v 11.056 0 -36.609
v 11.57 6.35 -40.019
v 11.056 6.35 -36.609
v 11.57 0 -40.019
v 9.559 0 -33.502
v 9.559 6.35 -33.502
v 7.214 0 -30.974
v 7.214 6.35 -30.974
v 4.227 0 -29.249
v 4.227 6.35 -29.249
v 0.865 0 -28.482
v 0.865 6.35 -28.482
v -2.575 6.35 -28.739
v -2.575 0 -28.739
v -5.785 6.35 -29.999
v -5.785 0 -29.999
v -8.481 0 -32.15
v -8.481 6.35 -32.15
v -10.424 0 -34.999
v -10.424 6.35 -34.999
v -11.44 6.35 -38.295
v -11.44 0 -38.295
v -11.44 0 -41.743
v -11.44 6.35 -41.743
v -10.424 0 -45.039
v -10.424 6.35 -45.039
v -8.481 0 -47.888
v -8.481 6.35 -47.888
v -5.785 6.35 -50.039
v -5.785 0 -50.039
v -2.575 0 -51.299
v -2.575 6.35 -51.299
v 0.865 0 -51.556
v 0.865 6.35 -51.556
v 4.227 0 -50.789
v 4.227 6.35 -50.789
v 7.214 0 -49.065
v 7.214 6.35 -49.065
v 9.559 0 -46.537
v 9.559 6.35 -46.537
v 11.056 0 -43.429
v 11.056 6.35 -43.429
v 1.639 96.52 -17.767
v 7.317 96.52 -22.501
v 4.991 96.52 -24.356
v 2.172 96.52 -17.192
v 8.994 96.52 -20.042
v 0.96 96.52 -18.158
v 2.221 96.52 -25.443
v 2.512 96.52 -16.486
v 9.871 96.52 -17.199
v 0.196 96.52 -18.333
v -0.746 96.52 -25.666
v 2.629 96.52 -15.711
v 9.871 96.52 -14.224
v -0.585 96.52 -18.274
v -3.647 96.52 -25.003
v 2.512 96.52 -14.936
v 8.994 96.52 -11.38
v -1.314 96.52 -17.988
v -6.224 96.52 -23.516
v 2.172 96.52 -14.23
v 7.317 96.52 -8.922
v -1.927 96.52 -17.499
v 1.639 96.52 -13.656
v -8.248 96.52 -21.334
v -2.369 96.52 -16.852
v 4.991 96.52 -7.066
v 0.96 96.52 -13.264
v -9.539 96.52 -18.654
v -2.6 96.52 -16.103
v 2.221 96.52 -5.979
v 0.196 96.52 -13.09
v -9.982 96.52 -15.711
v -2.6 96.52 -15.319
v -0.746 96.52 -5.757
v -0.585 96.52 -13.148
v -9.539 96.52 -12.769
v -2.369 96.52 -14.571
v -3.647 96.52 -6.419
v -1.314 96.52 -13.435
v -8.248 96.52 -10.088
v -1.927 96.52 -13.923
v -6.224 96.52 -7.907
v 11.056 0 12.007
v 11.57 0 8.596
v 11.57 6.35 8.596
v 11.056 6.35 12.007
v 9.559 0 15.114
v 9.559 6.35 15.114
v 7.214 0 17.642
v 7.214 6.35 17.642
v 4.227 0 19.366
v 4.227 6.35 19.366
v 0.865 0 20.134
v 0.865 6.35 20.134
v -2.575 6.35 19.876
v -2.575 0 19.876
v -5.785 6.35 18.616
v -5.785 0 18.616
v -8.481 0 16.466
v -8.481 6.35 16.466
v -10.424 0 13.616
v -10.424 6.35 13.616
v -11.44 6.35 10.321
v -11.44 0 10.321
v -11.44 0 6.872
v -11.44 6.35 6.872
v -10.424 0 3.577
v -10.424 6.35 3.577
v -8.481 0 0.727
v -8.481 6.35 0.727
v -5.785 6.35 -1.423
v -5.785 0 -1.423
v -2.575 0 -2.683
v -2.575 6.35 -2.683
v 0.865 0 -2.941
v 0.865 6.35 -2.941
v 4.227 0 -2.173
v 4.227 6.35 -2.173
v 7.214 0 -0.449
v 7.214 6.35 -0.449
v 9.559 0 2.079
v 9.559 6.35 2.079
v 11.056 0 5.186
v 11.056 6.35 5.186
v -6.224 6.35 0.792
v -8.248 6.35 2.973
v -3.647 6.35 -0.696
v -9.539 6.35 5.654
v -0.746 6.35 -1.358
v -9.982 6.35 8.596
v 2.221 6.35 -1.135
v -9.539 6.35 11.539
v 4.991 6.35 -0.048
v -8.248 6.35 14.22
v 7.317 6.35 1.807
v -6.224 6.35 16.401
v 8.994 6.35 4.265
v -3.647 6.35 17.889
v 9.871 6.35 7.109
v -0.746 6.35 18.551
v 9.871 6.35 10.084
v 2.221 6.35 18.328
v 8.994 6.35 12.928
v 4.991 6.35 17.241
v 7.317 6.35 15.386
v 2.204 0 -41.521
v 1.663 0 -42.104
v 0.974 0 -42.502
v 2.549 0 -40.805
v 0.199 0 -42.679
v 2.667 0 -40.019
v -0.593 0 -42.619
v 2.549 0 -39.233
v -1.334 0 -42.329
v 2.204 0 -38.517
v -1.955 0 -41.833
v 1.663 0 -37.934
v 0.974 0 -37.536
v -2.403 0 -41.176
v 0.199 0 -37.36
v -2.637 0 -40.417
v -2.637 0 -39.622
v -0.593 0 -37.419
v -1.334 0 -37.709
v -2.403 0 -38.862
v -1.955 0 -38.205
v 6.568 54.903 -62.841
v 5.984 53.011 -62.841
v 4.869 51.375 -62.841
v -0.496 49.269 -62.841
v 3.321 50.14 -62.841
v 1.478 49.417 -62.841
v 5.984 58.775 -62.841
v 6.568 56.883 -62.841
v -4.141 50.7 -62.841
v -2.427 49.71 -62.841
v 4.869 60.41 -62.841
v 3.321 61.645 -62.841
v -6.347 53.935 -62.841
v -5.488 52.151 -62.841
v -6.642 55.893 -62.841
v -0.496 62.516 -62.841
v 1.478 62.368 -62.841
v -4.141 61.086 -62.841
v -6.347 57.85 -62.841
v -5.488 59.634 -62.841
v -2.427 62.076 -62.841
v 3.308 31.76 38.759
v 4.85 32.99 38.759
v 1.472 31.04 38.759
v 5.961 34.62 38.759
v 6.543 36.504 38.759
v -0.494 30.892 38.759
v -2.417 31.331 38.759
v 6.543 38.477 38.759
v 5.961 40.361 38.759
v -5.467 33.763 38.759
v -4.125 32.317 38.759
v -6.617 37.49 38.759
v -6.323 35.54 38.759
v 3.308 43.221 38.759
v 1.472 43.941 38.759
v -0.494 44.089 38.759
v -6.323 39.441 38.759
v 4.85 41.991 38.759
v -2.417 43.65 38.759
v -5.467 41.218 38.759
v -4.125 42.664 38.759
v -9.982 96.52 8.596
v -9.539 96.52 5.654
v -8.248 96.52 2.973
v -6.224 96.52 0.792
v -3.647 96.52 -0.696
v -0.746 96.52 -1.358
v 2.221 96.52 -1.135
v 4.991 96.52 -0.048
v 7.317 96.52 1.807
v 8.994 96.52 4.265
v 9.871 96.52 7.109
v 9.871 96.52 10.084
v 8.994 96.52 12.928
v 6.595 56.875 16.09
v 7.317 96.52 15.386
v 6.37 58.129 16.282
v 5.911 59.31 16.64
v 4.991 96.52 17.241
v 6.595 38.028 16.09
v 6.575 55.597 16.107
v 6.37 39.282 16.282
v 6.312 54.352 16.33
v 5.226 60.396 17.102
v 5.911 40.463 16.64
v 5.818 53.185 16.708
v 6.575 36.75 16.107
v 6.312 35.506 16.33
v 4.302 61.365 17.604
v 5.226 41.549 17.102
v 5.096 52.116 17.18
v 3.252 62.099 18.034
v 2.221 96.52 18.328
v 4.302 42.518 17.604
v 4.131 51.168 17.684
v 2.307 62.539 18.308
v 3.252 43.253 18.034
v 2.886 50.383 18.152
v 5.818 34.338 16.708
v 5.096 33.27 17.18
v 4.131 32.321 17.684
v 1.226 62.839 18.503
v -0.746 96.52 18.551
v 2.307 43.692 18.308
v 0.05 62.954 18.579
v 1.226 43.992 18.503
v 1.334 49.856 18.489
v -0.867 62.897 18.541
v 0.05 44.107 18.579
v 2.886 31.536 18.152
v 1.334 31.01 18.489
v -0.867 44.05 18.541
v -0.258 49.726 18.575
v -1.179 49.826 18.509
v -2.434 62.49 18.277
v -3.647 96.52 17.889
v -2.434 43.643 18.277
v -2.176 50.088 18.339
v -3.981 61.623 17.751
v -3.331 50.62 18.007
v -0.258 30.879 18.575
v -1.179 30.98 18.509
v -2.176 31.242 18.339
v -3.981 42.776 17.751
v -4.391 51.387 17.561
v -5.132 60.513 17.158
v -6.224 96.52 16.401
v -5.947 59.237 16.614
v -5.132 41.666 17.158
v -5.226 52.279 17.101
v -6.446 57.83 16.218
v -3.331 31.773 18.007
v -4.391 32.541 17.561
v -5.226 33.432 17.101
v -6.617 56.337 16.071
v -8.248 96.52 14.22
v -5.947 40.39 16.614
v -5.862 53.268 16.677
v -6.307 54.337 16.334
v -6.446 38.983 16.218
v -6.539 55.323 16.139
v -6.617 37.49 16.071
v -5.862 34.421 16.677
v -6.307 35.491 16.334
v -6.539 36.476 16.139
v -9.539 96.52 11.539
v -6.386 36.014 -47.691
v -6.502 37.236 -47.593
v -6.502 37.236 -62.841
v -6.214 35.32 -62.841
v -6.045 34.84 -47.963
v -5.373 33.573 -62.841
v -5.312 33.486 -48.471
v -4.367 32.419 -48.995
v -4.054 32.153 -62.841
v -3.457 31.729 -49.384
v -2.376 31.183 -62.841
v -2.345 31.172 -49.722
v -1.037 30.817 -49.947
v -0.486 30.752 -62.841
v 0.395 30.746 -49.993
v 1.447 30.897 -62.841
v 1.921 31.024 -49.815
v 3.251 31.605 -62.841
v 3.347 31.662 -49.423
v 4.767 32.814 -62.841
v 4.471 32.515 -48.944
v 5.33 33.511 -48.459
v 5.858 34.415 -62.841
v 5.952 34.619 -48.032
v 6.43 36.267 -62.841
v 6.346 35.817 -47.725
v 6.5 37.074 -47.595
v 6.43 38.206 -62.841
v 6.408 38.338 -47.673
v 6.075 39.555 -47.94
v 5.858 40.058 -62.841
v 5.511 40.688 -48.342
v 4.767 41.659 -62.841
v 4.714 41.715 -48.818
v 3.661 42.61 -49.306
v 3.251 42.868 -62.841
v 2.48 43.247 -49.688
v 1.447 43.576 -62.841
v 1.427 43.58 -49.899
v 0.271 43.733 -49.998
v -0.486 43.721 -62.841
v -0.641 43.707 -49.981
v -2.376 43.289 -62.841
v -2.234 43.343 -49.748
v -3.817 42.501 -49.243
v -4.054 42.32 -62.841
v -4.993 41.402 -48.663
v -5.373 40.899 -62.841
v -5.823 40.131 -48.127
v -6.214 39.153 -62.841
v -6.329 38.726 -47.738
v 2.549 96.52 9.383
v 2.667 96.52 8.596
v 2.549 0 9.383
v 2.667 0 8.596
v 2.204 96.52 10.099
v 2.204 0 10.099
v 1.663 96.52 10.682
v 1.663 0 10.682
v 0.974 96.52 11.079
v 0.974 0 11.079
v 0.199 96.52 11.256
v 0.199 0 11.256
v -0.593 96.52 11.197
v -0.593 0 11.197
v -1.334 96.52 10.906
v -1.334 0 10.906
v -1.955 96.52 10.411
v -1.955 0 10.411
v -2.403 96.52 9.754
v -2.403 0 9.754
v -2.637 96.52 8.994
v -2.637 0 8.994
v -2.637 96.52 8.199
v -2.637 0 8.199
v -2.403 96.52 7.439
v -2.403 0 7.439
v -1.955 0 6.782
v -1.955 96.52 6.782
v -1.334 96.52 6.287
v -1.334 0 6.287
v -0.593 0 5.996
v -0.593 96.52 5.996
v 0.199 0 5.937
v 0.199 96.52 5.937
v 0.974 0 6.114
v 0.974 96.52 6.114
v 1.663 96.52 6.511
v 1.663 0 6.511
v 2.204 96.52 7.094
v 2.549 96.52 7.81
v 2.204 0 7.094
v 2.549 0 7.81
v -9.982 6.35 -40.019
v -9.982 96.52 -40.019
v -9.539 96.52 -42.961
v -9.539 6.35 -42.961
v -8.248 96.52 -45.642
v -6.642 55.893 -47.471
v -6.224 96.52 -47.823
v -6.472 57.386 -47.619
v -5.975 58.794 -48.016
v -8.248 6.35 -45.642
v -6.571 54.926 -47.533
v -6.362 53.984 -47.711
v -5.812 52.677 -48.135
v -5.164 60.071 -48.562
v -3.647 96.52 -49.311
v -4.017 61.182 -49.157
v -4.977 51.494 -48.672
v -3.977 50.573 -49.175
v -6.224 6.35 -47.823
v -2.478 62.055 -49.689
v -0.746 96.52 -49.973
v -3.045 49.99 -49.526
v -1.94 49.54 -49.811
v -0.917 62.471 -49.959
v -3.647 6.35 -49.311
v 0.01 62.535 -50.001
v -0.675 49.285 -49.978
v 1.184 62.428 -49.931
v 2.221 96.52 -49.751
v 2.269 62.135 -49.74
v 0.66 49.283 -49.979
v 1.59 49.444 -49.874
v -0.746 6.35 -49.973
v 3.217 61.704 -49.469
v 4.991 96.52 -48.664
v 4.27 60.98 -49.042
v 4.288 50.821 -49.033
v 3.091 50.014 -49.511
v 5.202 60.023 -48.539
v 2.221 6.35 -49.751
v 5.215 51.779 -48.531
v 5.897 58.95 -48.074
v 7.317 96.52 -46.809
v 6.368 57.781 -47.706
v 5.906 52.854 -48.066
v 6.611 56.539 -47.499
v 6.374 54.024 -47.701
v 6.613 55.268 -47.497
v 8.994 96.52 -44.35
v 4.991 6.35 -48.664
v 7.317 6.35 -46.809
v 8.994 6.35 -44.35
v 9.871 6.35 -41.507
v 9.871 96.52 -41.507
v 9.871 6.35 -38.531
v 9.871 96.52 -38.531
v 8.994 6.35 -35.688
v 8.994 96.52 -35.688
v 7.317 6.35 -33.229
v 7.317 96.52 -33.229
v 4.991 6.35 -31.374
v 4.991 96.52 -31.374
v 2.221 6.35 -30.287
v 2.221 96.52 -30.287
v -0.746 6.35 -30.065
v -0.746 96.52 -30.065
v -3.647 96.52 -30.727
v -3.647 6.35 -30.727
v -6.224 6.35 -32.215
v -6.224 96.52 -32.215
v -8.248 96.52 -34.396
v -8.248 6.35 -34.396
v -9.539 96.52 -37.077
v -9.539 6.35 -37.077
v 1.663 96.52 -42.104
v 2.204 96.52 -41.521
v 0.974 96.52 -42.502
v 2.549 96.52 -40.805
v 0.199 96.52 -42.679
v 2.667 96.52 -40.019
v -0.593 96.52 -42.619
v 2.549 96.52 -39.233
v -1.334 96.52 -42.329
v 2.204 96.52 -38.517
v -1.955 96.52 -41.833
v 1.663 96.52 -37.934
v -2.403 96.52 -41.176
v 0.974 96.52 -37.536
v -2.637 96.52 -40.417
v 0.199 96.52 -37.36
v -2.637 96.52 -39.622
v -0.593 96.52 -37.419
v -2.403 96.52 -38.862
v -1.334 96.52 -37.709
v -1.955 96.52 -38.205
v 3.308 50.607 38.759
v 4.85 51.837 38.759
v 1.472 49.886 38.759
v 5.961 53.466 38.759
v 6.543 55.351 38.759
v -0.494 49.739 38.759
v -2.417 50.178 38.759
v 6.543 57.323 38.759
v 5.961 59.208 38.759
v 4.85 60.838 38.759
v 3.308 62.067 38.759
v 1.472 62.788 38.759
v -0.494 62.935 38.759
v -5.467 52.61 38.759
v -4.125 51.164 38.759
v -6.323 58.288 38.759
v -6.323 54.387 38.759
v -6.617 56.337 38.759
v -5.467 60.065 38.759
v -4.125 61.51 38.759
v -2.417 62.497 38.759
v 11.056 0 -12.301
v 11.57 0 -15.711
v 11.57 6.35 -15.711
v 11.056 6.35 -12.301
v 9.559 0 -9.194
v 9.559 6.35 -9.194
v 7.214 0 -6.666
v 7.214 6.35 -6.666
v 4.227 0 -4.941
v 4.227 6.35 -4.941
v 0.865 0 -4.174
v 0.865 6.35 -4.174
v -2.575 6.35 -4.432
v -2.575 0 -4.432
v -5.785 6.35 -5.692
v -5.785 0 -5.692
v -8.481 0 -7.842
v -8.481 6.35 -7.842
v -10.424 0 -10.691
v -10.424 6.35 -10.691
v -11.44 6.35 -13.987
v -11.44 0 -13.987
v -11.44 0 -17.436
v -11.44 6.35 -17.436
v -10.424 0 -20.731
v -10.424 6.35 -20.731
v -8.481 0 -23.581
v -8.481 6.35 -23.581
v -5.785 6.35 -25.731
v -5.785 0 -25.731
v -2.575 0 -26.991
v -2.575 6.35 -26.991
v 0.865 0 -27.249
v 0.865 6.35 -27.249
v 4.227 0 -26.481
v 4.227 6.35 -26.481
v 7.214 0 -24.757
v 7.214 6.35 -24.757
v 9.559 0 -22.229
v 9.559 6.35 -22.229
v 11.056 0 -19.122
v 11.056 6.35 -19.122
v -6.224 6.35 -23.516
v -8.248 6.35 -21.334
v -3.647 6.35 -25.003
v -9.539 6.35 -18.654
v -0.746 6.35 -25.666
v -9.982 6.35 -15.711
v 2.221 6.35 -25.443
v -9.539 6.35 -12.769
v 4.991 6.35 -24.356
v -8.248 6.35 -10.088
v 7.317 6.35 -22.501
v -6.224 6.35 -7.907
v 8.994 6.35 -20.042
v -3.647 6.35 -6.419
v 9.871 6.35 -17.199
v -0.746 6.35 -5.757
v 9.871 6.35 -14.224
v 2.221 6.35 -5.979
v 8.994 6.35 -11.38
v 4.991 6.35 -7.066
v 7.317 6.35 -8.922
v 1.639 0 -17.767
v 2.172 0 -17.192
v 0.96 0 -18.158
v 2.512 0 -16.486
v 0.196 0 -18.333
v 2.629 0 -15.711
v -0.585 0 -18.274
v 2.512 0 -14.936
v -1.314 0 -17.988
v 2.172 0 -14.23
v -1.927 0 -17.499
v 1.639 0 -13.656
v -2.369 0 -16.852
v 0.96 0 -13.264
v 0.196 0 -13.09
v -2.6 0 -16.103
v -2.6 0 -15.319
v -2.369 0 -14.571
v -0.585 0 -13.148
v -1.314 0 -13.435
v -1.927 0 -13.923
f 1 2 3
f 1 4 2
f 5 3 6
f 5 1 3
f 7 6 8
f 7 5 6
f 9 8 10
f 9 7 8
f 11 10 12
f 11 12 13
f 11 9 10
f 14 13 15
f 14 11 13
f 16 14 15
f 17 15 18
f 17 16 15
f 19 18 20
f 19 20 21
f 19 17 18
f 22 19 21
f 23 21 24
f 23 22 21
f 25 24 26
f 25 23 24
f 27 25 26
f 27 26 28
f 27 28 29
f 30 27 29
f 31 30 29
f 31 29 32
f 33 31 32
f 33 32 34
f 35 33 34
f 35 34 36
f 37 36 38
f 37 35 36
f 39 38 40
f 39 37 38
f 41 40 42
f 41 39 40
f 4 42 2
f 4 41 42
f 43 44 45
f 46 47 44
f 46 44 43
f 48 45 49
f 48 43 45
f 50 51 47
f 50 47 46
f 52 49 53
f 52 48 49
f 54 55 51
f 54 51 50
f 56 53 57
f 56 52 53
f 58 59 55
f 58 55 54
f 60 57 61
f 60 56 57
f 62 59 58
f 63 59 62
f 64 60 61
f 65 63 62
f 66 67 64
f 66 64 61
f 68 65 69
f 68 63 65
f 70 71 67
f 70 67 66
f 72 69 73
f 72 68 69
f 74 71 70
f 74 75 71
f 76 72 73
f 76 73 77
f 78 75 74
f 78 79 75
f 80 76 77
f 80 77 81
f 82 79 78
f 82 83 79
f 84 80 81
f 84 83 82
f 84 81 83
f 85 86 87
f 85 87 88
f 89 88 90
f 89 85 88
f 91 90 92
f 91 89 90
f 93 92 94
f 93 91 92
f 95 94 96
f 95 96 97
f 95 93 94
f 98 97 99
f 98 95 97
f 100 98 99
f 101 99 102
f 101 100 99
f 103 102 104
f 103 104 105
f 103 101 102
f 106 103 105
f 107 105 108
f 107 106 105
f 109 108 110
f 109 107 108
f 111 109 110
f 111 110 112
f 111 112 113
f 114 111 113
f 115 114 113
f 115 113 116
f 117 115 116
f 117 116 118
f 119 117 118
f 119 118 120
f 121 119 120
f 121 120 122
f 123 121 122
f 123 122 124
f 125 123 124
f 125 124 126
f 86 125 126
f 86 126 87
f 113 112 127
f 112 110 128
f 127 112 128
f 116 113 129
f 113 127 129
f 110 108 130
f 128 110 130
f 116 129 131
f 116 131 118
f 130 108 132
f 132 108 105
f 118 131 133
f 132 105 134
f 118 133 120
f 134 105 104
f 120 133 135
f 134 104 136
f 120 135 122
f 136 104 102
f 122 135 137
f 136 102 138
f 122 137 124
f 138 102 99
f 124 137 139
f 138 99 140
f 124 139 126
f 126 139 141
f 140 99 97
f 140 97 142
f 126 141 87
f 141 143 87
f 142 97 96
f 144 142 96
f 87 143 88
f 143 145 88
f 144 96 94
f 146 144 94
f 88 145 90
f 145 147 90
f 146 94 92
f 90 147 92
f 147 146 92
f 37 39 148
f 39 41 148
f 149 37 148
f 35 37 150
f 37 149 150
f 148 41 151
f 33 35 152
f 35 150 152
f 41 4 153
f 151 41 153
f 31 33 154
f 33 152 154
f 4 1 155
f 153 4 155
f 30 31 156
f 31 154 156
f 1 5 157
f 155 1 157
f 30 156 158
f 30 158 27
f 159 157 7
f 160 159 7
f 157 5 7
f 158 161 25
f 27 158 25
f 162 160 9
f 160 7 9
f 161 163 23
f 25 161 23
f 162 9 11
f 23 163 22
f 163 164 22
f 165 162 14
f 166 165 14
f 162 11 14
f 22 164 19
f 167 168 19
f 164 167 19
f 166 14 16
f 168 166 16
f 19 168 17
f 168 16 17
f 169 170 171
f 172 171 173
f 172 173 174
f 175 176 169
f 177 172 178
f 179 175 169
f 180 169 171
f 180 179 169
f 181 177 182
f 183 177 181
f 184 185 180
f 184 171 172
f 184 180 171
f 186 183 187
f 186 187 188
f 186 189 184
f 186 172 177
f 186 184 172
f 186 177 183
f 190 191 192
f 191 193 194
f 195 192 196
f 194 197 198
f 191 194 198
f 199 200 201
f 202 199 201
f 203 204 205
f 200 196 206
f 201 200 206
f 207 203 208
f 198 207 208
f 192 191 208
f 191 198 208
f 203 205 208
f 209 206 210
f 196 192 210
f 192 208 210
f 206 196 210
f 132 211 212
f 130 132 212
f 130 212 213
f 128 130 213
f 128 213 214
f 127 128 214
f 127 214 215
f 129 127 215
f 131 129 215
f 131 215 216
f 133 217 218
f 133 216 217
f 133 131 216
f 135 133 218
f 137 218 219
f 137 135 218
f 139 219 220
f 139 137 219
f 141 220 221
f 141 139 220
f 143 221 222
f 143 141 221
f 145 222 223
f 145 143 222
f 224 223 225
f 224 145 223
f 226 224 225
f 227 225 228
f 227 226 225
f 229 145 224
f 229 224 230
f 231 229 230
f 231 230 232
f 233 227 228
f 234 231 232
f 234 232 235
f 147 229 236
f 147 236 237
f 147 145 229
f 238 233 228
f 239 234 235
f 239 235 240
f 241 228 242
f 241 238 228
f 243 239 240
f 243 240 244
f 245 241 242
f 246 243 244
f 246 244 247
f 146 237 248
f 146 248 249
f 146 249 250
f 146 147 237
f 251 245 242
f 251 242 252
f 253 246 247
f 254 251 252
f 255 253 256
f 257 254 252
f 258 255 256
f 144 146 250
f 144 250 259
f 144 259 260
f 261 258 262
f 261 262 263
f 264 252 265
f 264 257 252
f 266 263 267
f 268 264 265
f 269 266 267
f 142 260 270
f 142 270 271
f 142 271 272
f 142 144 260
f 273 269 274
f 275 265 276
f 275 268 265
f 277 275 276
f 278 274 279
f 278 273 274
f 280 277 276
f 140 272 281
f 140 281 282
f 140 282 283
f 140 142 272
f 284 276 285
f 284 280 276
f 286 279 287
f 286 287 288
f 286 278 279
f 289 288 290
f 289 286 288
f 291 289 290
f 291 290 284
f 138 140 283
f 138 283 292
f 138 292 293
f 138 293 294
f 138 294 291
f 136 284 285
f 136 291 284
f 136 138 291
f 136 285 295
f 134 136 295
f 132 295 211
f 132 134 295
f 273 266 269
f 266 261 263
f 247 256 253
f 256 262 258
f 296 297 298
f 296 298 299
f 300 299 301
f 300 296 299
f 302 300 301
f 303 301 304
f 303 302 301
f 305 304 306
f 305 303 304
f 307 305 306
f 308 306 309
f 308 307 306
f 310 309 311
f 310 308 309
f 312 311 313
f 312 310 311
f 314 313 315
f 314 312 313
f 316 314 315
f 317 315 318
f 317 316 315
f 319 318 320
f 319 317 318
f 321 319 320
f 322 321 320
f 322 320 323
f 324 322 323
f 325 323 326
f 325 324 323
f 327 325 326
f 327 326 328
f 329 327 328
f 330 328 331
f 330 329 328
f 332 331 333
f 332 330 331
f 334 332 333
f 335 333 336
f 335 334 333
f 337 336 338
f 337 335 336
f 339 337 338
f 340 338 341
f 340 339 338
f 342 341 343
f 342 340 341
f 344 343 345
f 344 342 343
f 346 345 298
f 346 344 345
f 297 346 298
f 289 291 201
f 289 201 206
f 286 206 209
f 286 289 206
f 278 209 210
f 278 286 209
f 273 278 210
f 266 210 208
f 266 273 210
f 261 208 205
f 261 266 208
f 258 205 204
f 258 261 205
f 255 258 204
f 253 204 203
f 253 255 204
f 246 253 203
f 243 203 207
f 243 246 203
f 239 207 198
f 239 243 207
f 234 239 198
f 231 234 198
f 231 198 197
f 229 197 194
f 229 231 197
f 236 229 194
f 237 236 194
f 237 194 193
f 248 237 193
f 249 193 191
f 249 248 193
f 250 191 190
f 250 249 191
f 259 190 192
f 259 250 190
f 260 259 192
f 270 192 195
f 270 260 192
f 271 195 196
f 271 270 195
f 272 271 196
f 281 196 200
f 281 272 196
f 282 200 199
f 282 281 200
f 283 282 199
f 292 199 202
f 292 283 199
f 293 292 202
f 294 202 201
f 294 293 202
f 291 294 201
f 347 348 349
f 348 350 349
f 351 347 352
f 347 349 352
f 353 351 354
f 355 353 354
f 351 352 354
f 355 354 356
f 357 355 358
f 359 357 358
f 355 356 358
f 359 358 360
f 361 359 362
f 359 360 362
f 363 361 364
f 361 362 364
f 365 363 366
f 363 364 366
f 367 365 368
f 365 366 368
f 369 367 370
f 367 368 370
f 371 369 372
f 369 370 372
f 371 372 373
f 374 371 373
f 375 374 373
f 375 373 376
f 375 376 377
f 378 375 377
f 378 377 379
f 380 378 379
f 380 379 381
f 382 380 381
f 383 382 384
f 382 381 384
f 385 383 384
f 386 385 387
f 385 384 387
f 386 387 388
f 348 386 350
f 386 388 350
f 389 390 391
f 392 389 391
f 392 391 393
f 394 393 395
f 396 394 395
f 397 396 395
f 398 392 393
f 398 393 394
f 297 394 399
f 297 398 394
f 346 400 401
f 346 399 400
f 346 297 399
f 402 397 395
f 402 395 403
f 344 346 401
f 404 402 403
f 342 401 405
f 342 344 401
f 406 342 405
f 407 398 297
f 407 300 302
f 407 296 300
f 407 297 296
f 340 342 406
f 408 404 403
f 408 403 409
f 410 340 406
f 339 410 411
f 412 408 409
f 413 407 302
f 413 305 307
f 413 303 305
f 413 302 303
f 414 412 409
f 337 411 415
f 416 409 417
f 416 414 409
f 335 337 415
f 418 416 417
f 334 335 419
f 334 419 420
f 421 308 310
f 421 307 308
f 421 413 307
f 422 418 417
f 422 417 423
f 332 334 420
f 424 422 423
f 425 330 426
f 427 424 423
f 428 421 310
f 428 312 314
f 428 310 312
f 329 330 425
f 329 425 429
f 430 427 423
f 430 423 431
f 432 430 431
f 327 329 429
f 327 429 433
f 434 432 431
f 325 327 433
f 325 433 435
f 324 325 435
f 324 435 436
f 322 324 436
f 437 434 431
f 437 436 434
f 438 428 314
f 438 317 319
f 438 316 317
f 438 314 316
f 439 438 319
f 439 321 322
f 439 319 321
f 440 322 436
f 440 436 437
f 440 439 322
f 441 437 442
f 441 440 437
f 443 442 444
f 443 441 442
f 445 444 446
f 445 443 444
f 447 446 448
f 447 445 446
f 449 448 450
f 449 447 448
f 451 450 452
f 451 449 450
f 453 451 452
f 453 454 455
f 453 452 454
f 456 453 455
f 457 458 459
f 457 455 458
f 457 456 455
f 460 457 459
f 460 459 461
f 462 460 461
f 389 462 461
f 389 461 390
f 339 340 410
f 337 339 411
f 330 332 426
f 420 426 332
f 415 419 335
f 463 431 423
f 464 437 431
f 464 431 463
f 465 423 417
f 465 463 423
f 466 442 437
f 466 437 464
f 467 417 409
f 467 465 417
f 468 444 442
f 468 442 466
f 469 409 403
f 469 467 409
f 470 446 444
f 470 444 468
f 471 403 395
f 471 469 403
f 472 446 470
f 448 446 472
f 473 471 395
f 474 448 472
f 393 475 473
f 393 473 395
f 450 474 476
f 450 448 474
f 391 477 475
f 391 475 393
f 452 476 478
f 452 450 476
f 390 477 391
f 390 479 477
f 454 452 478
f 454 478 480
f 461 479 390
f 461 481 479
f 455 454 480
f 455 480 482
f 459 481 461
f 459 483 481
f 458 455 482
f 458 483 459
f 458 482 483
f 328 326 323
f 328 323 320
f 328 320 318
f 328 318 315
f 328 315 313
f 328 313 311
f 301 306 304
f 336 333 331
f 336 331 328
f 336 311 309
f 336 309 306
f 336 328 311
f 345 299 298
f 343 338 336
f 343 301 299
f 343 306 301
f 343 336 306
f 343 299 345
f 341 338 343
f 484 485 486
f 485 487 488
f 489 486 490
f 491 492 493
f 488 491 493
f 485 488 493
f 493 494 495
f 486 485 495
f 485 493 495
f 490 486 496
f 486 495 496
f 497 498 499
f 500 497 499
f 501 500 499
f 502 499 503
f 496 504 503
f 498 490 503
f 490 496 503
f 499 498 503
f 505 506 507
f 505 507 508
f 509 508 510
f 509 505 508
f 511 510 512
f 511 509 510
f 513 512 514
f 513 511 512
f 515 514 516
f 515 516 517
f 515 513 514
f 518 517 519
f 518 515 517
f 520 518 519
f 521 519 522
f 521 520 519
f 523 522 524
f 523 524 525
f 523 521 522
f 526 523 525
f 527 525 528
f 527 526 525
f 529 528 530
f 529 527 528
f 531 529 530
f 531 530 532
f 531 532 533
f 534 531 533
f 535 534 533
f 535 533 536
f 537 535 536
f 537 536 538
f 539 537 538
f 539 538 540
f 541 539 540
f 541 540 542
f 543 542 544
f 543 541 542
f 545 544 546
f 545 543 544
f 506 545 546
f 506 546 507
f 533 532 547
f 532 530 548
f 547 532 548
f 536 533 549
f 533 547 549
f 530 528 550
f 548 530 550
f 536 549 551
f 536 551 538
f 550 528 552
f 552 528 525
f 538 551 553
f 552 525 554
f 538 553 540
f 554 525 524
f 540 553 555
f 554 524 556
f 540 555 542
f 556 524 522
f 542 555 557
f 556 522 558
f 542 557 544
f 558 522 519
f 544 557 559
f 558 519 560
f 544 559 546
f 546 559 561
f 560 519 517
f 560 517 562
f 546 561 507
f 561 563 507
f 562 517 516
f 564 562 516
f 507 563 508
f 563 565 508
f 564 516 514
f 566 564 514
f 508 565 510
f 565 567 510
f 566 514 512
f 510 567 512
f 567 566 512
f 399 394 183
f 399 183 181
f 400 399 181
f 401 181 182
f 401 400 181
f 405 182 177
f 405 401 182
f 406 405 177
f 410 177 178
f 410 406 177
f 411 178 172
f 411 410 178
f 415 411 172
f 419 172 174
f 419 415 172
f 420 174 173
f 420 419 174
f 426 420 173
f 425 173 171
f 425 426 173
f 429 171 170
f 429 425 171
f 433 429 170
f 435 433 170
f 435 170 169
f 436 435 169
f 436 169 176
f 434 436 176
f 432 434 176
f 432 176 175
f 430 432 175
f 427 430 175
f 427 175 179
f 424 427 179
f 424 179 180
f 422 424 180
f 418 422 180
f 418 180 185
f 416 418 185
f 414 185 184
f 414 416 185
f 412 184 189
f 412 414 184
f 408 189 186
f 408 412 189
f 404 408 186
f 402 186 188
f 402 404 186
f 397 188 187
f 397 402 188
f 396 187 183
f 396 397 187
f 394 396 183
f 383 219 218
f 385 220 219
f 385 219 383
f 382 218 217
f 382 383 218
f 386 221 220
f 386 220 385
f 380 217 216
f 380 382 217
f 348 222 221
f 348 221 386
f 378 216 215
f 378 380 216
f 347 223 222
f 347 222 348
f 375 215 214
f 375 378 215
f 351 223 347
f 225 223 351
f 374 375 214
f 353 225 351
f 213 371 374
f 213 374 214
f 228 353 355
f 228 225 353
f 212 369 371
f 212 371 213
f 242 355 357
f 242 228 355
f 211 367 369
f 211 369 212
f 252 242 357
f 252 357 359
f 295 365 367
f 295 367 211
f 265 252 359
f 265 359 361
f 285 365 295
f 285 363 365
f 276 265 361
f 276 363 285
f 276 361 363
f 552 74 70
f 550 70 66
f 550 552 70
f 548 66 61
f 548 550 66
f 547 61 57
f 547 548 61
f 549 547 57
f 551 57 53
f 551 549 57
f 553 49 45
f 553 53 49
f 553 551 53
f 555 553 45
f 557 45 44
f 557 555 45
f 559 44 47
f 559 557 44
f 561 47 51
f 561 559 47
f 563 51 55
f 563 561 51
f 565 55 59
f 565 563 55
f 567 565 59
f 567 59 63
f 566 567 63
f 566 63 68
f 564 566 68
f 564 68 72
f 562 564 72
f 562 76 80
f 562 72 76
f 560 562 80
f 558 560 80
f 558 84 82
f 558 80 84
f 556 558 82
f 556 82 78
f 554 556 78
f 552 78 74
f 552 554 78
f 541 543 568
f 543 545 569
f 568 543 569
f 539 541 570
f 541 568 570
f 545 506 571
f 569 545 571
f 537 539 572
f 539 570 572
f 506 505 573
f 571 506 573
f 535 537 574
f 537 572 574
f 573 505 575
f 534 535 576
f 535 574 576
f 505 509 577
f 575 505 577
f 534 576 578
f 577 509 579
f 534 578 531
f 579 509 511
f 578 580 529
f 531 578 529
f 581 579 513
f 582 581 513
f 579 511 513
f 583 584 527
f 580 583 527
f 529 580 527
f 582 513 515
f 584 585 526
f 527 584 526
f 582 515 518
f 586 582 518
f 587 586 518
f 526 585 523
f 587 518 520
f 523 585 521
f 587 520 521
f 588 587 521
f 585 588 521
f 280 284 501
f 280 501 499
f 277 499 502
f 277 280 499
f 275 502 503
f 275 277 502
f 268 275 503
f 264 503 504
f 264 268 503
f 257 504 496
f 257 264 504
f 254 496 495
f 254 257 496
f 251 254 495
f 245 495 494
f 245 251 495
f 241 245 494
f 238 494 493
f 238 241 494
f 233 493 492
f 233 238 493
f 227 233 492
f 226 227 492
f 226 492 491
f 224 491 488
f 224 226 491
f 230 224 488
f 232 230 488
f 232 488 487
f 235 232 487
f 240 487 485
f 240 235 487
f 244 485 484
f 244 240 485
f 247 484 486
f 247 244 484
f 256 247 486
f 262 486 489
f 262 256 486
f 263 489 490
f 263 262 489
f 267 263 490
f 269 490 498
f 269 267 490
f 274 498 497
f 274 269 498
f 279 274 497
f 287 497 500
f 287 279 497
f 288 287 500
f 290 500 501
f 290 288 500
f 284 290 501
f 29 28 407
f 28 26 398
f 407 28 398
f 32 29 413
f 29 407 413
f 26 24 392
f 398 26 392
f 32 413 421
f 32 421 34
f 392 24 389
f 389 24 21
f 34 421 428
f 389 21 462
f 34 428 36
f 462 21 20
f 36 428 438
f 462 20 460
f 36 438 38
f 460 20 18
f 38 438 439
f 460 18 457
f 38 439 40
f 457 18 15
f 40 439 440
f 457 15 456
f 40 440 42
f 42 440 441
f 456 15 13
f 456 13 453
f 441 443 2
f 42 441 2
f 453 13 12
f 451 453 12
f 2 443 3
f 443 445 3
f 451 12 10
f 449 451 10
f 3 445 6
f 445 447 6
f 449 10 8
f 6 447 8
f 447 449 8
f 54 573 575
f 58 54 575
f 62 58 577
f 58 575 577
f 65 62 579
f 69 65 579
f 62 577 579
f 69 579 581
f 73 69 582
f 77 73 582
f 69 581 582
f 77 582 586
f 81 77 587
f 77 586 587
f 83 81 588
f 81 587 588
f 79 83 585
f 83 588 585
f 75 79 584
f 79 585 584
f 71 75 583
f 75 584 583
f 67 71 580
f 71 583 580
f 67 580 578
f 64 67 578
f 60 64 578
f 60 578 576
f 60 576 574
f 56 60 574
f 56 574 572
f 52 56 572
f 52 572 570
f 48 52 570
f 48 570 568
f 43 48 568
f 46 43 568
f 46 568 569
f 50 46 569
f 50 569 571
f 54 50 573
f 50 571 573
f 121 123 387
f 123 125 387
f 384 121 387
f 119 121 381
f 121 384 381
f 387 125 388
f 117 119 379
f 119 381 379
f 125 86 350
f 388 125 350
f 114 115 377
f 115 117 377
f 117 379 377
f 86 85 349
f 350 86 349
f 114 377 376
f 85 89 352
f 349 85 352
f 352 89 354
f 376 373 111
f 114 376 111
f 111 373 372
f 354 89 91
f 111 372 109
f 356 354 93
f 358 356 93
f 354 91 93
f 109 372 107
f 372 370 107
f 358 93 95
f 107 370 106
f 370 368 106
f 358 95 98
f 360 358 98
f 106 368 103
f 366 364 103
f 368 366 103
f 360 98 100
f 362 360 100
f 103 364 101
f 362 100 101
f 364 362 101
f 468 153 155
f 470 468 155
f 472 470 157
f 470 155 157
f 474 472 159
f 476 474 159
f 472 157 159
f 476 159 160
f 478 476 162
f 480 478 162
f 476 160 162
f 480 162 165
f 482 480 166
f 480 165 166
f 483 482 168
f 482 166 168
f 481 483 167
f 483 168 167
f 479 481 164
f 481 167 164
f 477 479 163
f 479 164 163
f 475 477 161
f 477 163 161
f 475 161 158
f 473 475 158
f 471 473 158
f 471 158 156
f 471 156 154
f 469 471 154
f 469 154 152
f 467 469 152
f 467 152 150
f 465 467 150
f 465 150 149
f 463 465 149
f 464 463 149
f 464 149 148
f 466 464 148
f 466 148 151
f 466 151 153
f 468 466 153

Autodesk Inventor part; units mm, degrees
ref_plane "YZ Plane" through (0, 0, 0) normal (1, 0, 0) x (0, 1, 0)
sketch "Sketch1" plane through (0, 0, 0) normal (0, 1, 0) x (-1, 0, 0)
  circle A0 centre (0, 8.5965) radius 9.9822
  circle A1 centre (0, -40.0191) radius 9.9822
  circle A2 centre (0, -15.7113) radius 9.9822
  point P0 (0, 0)
  dimension "d0" = 19.9644
  dimension "d2" = 19.9644
  dimension "d4" = 19.9644
extrude "Extrusion1" add sketch "Sketch1" along normal blind 96.52
ref_plane "Work Plane1" through (0, 48.26, -15.7113) normal (0, 1, 0) x (1, 0, 0)
ref_plane "Work Plane2" through (0, 96.52, 8.5965) normal (-1, 0, 0) x (0, 1, 0)
sketch "Sketch2" plane through (0, 96.52, 8.5965) normal (-1, 0, 0) x (0, 1, 0)
  line L0 (-66.6496, -34.925) -> (-66.6496, 3.175)
  line L1 (-66.6496, 3.175) -> (-34.5694, 3.175)
  line L2 (-34.5694, 3.175) -> (-34.5694, -34.925)
  line L3 (-96.52, -9.9822) -> (-96.52, 9.9822) projected
  line L4 (-34.5694, -34.925) -> (-47.8028, -34.925)
  line L5 (-47.8028, -34.925) -> (-47.8028, -1.5875)
  line L6 (-47.8028, -1.5875) -> (-34.5694, -1.5875)
  line L7 (-34.5694, -1.5875) -> (-34.5694, -34.925)
  line L8 (-66.6496, -34.925) -> (-53.4162, -34.925)
  line L9 (-53.4162, -34.925) -> (-53.4162, 4.7625)
  line L10 (-53.4162, 4.7625) -> (-66.6496, 4.7625)
  line L11 (-66.6496, 4.7625) -> (-66.6496, -34.925)
  line L12 (-34.5694, -34.925) -> (-47.8028, -34.925)
  line L13 (-53.4162, -34.925) -> (-66.6496, -34.925)
  line L14 (-60.0329, -34.925) -> (-60.0329, -4.7625)
  line L15 (-60.0329, -34.925) -> (-29.8704, -34.925) construction
  line L16 (-41.1861, -34.925) -> (-41.1861, -1.5875)
  point P0 (-96.52, 8.5965)
  dimension "d7" = 32.0802
  dimension "d8" = 29.8704
  dimension "d9" = 13.2334
  dimension "d10" = 13.2334
  dimension "d11" = 90
ref_plane "Work Plane3" through (0, 36.4871, 13.359) normal (0, 1, 0) x (-1, 0, 0)
ref_plane "Work Plane4" through (0, 36.4871, 13.359) normal (0, 0, -1) x (-1, 0, 0)
sketch "Sketch3" plane through (0, 36.4871, 13.359) normal (0, 0, -1) x (-1, 0, 0)
  circle A0 centre (0, 19.8501) radius 6.6167
  circle A1 centre (0, 1.0033) radius 6.6167
  line L0 (9.9822, -36.4871) -> (-9.9822, -36.4871) projected
  point P0 (0, -36.4871)
  dimension "d12" = 13.2334
  dimension "d13" = 13.2334
  dimension "d14" = 18.8468
  dimension "d15" = 37.4904
extrude "Extrusion2" add sketch "Sketch3" against normal blind 25.4
ref_plane "Work Plane5" through (0, 36.4871, -37.441) normal (0, 0, -1) x (-1, 0, 0)
sketch "Sketch4" plane through (0, 36.4871, -37.441) normal (0, 0, -1) x (-1, 0, 0)
  circle A0 centre (0, 0.7493) radius 6.5024
  line L0 (9.9822, -36.4871) -> (-9.9822, -36.4871) projected
  circle A1 centre (0, 19.4056) radius 6.6421
  point P0 (0, -36.4871)
  dimension "d19" = 13.0048
  dimension "d20" = 37.2364
  dimension "d21" = 13.2842
  dimension "d22" = 18.6563
extrude "Extrusion3" add sketch "Sketch4" along normal blind 25.4
sketch "Sketch5" plane through (0, 36.4871, 13.359) normal (0, 1, 0) x (-1, 0, 0)
  line L0 (-39.8014, 49.0087) -> (-32.7742, 49.0087) construction
  line L1 (-32.7742, 49.0087) -> (-32.7742, 45.7532) construction
  line L2 (-32.7742, 45.7532) -> (-39.8014, 45.7532) construction
  line L3 (-39.8014, 45.7532) -> (-39.8014, 49.0087) construction
  point P0 (0, -13.359)
sketch "Sketch6" plane through (0, 96.52, 8.5965) normal (-1, 0, 0) x (0, 1, 0)
  line L0 (-90.4372, -13.4088) -> (-78.4506, -13.4088) construction
  line L1 (-78.4506, -13.4088) -> (-78.4506, -32.5517) construction
  line L2 (-78.4506, -32.5517) -> (-90.4372, -32.5517) construction
  line L3 (-90.4372, -32.5517) -> (-90.4372, -13.4088) construction
  line L4 (-99.2622, 70.1776) -> (-82.6777, 70.1776) construction
  line L5 (-82.6777, 70.1776) -> (-82.6777, 48.1001) construction
  line L6 (-82.6777, 48.1001) -> (-99.2622, 48.1001) construction
  line L7 (-99.2622, 48.1001) -> (-99.2622, 70.1776) construction
  point P0 (-96.52, 8.5965)
sketch "Sketch7" plane through (0, 0, 8.5965) normal (0, -1, 0) x (1, 0, 0)
  circle A0 centre (0, 0) radius 11.5697
  circle A1 centre (0, -48.6156) radius 9.9822 projected
  circle A2 centre (0, -48.6156) radius 11.5697
  circle A3 centre (0, -24.3078) radius 9.9822 projected
  circle A4 centre (0, -24.3078) radius 11.5697
  point P0 (0, -8.5965)
  dimension "d25" = 23.1394
  dimension "d26" = 23.1394
  dimension "d27" = 23.1394
extrude "Extrusion4" add sketch "Sketch7" against normal blind 6.35 contours A0 | A1 | A2 | A3 | A4
sketch "Sketch8" plane through (0, 0, -15.7113) normal (0, -1, 0) x (1, 0, 0)
  circle A0 centre (0, 24.3078) radius 9.9822 projected
  circle A1 centre (0, 24.3078) radius 11.5697 projected
  circle A2 centre (0, 0) radius 9.9822 projected
  circle A3 centre (0, -24.3078) radius 9.9822 projected
  circle A4 centre (0, -24.3078) radius 2.667
  circle A5 centre (0, 0) radius 2.6289
  circle A6 centre (0, 24.3078) radius 2.667
  point P0 (0, 15.7113)
  dimension "d30" = 5.334
  dimension "d31" = 5.2578
  dimension "d32" = 5.334
extrude "Extrusion5" cut sketch "Sketch8" against normal through all contours A4 | A5 | A6
properties part number "Valves" material "Brass, Soft Yellow"
